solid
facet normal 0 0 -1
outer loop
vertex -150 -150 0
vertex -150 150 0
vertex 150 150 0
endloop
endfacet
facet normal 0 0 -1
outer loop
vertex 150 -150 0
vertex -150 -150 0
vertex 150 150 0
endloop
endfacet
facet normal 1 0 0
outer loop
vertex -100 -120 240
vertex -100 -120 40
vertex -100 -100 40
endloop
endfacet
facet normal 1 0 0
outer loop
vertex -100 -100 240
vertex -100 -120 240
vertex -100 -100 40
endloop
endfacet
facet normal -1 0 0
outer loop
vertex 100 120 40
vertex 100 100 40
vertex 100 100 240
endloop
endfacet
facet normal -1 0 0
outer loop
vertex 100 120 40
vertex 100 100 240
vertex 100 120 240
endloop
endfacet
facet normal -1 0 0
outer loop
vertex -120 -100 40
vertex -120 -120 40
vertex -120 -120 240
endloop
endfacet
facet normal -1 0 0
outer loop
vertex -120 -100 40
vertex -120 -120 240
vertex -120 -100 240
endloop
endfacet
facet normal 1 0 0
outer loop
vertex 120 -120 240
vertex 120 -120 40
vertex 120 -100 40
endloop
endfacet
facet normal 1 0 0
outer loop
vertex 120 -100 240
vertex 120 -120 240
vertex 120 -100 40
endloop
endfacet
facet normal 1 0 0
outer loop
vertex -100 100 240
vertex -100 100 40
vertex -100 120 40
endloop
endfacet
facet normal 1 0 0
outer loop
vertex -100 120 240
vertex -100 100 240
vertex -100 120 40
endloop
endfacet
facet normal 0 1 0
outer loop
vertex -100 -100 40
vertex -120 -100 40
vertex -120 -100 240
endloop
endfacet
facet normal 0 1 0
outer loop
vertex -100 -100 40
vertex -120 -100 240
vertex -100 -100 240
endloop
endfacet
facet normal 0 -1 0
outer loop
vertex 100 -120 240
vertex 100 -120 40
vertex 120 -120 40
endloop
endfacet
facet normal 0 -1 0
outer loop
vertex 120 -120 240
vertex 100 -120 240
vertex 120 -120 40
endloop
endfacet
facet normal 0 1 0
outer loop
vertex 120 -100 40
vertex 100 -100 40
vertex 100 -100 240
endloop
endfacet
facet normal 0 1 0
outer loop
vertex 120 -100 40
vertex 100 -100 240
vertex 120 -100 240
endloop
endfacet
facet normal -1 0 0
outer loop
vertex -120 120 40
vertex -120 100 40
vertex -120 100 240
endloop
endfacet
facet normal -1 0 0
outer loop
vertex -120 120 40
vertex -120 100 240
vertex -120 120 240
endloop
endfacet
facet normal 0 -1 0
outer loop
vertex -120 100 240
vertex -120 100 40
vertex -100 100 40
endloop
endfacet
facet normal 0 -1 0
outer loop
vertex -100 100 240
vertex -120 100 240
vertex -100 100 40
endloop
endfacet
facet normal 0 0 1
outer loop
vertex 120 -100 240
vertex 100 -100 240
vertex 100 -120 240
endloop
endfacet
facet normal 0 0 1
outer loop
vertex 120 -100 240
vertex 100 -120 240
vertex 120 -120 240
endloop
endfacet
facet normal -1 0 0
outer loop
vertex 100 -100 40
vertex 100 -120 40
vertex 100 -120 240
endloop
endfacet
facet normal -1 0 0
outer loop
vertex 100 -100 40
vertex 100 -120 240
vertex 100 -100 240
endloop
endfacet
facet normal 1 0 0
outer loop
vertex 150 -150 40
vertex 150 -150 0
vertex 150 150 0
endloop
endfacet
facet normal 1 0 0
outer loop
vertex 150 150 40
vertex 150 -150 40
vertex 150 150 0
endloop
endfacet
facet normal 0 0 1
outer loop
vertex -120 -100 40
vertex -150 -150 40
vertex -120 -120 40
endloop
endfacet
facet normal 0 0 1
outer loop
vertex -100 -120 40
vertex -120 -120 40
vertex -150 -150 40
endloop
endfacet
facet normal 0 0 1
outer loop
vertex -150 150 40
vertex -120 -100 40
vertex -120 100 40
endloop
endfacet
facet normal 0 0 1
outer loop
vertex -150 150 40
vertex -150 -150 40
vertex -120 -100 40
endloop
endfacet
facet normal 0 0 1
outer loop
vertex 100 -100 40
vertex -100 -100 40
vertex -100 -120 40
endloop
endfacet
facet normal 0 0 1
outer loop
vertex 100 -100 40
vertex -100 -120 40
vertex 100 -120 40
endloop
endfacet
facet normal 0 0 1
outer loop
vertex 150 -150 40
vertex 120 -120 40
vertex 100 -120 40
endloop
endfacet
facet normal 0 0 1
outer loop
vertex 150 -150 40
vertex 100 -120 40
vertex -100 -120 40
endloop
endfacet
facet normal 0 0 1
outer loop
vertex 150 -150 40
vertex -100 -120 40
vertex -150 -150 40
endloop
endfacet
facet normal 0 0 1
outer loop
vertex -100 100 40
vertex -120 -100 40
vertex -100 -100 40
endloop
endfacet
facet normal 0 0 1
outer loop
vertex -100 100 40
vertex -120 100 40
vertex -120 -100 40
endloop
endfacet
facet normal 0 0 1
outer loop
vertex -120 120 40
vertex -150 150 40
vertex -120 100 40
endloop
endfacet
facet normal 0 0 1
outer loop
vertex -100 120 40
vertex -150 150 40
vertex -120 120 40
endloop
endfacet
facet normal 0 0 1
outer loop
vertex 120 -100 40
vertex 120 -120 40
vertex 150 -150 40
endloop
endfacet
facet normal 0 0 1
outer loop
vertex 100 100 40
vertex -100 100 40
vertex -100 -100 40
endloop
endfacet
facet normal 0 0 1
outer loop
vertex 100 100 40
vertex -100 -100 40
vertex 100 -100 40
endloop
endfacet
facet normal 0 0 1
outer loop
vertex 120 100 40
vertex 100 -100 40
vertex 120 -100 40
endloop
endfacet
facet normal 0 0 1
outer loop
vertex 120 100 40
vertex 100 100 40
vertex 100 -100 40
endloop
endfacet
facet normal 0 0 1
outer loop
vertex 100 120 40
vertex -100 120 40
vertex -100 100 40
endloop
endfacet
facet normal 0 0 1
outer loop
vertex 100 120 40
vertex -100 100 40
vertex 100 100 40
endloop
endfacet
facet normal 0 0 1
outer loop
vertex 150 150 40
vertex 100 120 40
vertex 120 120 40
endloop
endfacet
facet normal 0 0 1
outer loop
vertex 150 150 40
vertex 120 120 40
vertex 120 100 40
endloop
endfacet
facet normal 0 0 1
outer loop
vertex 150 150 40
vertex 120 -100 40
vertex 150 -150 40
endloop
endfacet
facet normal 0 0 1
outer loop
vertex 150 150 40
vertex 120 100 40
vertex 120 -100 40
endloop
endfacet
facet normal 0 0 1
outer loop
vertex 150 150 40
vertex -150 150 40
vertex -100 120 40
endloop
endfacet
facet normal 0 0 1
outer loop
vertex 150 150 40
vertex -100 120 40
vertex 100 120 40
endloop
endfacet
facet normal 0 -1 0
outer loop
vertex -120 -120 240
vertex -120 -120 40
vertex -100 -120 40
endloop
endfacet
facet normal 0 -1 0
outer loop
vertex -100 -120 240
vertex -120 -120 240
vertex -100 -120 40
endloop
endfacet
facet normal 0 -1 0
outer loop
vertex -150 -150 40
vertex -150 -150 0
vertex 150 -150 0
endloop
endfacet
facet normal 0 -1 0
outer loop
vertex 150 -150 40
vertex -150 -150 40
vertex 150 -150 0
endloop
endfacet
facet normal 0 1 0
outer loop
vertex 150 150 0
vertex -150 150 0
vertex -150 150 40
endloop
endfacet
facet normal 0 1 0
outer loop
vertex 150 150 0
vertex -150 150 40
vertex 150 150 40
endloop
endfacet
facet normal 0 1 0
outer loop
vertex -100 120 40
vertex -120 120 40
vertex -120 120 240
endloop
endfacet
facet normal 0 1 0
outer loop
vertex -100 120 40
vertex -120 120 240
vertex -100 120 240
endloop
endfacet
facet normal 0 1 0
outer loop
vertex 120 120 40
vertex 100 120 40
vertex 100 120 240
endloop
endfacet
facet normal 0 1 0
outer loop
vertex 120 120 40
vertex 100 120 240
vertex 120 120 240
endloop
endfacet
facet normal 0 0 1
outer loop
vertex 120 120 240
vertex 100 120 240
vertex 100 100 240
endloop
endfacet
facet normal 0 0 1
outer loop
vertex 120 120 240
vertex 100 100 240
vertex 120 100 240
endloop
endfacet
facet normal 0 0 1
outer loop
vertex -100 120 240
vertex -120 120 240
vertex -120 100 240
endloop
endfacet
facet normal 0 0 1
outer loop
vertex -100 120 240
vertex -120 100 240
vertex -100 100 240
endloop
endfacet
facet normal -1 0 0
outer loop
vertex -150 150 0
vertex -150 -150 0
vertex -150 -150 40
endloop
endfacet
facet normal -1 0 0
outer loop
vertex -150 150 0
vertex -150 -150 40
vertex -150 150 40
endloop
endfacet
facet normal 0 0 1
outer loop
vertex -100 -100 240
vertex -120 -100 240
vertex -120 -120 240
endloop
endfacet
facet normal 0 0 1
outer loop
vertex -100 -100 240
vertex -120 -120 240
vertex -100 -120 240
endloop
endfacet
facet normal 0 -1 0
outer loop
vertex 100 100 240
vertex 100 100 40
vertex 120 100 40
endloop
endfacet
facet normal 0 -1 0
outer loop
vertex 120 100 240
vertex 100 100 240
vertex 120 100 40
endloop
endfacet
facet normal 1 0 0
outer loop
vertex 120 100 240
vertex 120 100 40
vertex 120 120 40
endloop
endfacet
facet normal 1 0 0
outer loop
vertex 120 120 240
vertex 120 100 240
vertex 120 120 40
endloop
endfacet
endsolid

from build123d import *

# Parameters (mm, degrees)
SKETCH1_W           = 300
SKETCH1_H           = 300
BOSS_EXTRUDE1_DEPTH = 40
SKETCH2_W           = 20
SKETCH2_H           = 20
BOSS_EXTRUDE2_DEPTH = 200


with BuildPart() as part:
    # Sketch1 → Boss-Extrude1 (new body)
    with BuildSketch(Plane.XY):
        Rectangle(SKETCH1_W, SKETCH1_H)
    extrude(amount=BOSS_EXTRUDE1_DEPTH)

    # Sketch2 → Boss-Extrude2 (add)
    with BuildSketch(Plane.XY.offset(40)):
        with Locations((110, 110)):
            Rectangle(SKETCH2_W, SKETCH2_H)
        with Locations((-110, 110)):
            Rectangle(SKETCH2_W, SKETCH2_H)
        with Locations((-110, -110)):
            Rectangle(SKETCH2_W, SKETCH2_H)
        with Locations((110, -110)):
            Rectangle(SKETCH2_W, SKETCH2_H)
    extrude(amount=BOSS_EXTRUDE2_DEPTH)


solid = part.part
